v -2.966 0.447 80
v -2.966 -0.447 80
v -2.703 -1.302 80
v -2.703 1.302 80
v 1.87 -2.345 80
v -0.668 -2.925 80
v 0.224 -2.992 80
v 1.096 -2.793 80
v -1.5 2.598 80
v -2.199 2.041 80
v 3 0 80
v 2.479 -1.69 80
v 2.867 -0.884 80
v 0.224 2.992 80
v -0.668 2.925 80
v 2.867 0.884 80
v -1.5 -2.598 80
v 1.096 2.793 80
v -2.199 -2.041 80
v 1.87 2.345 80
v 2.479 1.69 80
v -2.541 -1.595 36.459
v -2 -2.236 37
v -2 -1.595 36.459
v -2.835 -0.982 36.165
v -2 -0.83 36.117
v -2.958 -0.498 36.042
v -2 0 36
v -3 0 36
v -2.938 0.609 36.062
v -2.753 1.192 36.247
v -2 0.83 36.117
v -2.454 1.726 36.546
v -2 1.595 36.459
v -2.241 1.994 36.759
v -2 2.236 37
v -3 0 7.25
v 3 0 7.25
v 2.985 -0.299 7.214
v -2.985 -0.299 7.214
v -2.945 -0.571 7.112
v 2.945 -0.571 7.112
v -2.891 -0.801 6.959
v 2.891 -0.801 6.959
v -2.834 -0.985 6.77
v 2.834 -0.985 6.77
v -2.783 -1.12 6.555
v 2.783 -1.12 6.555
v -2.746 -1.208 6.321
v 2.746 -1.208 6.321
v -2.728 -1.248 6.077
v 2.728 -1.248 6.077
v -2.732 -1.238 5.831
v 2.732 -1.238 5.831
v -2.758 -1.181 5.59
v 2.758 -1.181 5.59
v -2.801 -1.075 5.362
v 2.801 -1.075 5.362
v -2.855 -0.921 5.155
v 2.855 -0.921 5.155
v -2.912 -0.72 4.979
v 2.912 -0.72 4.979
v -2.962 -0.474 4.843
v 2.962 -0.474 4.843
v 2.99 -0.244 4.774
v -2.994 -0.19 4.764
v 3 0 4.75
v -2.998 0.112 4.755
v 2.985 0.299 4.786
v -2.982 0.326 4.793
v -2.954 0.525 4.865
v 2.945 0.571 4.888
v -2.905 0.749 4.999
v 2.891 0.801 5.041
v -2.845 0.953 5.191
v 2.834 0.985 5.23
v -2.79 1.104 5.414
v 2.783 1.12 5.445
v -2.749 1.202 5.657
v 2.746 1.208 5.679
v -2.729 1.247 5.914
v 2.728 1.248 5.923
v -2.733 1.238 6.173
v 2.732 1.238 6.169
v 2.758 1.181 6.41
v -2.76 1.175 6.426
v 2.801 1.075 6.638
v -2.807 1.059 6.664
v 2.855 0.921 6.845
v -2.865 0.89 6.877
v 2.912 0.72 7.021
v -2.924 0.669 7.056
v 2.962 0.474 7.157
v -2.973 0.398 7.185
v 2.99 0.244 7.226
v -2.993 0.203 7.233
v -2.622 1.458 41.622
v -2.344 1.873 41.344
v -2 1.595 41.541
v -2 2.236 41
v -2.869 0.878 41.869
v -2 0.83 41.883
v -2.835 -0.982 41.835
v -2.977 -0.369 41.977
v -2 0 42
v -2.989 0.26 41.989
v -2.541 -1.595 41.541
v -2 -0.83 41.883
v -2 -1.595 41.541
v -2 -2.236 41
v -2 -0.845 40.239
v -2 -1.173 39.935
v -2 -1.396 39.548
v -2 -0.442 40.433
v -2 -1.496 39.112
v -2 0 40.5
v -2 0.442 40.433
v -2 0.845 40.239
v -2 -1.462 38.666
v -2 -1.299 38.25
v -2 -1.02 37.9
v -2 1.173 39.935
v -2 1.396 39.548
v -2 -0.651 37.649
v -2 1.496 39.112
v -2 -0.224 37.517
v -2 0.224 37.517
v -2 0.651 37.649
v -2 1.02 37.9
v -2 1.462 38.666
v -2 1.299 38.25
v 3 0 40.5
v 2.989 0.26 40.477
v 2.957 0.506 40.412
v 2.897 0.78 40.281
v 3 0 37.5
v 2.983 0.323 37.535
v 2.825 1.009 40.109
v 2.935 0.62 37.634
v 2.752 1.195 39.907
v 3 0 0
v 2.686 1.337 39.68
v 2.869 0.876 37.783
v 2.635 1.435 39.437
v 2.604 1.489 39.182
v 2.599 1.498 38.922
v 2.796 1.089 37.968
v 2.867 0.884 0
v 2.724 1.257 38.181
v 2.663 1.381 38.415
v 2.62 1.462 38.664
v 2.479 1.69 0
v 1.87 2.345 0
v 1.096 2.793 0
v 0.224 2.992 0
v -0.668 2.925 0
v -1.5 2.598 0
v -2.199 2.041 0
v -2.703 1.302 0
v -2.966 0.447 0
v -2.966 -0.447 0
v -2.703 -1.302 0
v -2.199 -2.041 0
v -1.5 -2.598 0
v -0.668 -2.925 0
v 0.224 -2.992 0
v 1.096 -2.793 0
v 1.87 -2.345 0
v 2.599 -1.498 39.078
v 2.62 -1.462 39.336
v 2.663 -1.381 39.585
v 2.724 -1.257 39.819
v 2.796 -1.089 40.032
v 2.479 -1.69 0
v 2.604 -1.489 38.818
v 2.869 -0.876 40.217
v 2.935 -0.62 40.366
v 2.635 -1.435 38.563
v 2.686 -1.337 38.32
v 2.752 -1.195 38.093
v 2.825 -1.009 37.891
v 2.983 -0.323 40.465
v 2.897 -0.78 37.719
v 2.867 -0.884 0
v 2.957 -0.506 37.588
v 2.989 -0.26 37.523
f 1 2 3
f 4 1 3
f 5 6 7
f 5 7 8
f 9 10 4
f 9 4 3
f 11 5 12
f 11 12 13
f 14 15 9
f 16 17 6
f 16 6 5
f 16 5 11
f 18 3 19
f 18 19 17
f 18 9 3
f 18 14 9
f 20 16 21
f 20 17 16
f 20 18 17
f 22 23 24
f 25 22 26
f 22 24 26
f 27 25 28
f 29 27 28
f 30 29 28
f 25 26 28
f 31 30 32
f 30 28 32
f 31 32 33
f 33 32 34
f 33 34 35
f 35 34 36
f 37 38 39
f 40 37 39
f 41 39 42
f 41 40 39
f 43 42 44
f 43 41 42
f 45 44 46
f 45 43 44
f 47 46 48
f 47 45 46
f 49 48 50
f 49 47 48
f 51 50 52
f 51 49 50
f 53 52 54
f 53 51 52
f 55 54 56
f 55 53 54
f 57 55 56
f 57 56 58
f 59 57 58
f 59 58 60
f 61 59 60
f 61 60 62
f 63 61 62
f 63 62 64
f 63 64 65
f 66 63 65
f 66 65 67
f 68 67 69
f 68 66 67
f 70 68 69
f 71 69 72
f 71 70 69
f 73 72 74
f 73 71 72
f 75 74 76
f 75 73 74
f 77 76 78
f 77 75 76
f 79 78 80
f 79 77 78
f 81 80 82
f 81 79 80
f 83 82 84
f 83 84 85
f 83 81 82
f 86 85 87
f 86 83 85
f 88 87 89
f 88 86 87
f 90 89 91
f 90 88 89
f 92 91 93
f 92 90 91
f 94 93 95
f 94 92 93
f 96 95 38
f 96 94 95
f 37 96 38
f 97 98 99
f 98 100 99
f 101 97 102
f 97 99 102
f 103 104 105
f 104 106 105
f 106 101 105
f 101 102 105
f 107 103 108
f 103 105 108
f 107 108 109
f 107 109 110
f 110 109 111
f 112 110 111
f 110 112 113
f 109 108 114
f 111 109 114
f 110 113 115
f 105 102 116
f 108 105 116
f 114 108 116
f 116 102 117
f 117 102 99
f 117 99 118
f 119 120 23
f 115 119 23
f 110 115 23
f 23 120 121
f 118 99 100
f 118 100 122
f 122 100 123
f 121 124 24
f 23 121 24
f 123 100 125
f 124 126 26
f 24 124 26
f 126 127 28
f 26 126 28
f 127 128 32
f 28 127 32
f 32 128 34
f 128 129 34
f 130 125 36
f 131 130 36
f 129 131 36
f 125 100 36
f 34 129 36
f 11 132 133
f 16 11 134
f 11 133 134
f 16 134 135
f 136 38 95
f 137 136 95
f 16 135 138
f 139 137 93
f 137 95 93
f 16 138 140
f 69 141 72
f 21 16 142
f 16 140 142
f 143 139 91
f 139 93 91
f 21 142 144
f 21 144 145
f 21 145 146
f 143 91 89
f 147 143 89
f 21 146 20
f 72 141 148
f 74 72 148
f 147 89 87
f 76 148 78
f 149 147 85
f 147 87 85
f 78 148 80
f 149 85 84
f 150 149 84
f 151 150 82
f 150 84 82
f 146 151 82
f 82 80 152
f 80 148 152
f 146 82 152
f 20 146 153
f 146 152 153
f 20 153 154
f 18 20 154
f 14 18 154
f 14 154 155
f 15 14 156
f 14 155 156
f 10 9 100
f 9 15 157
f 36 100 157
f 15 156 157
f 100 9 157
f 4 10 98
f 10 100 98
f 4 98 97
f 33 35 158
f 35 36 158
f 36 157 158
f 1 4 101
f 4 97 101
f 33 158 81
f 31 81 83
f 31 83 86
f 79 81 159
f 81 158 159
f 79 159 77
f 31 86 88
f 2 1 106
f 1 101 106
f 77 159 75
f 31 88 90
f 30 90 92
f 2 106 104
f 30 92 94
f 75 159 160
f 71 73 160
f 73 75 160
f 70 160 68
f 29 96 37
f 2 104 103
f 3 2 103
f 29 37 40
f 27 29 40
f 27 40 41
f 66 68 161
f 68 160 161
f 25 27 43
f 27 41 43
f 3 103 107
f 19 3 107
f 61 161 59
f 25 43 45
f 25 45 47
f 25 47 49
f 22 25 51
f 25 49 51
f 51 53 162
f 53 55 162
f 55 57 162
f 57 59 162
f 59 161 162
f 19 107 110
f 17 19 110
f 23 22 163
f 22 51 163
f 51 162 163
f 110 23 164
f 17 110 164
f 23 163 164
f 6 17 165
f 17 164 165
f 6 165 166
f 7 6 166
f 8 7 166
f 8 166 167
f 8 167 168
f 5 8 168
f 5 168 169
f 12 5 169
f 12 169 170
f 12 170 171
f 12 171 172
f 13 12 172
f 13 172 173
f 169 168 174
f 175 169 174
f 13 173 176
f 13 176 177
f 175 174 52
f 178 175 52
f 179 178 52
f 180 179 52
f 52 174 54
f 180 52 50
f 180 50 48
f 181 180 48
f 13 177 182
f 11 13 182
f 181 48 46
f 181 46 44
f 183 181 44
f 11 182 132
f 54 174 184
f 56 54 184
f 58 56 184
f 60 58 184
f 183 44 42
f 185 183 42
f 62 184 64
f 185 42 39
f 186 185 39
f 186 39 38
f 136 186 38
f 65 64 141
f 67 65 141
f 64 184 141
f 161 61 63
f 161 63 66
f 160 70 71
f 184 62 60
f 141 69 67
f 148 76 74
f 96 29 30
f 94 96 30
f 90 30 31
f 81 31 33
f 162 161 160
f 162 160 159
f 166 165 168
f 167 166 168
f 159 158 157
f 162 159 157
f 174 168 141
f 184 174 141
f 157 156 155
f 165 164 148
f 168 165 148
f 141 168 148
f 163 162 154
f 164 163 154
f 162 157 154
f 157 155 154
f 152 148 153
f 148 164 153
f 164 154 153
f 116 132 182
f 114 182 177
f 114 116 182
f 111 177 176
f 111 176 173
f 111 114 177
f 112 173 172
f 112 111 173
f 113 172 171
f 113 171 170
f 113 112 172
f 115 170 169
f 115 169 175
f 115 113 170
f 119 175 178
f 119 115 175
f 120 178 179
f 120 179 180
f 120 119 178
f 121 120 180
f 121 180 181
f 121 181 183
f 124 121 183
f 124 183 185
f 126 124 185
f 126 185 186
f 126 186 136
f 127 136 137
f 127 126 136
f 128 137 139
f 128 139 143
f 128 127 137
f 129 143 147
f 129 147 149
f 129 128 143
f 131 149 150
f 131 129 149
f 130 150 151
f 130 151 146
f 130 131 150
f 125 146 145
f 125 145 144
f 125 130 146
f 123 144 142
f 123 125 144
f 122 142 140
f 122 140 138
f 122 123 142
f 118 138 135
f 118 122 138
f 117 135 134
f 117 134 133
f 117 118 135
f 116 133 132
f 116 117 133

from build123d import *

# Parameters (mm, degrees)
ESQUISSE1_R                  = 3
BOSS_EXTRU_1_DEPTH           = 80
ENL_V_MAT_EXTRU_1_DEPTH      = 81.112421009
ENL_V_MAT_EXTRU_1_DEPTH_BACK = 81.112421009
ESQUISSE2_R                  = 1.25
ESQUISSE2_R_2                = 1.5
ENL_V_START                  = -3
ESQUISSE3_R                  = 3
ENL_V_MAT_EXTRU_2_DEPTH      = 1


with BuildPart() as part:
    # Esquisse1 → Boss.-Extru.1 (new body)
    with BuildSketch(Plane.XY):
        Circle(ESQUISSE1_R)
    extrude(amount=BOSS_EXTRU_1_DEPTH)

    # Esquisse2 → Enlèv. mat.-Extru.1 (cut, two sides: drawn at the far end of the back side and taken through both)
    with BuildSketch(Plane(origin=(0, 0, 0), x_dir=(0, 0, -1), z_dir=(1, 0, 0)).offset(-ENL_V_MAT_EXTRU_1_DEPTH_BACK)):
        with Locations(Location((-6, 0, 0), (0, 0, 180.000000002))):
            Circle(ESQUISSE2_R)
        with Locations(Location((-39, 0, 0), (0, 0, 179.999999999))):
            Circle(ESQUISSE2_R_2)
    extrude(amount=ENL_V_MAT_EXTRU_1_DEPTH + ENL_V_MAT_EXTRU_1_DEPTH_BACK, mode=Mode.SUBTRACT)

    # Esquisse3 → Enlèv. mat.-Extru.2 (cut, symmetric)
    with BuildSketch(Plane(origin=(0, 0, 0), x_dir=(0, 0, -1), z_dir=(1, 0, 0)).offset(ENL_V_START)):
        with Locations((-39, 0)):
            Circle(ESQUISSE3_R)
    extrude(amount=ENL_V_MAT_EXTRU_2_DEPTH, both=True, mode=Mode.SUBTRACT)


solid = part.part
